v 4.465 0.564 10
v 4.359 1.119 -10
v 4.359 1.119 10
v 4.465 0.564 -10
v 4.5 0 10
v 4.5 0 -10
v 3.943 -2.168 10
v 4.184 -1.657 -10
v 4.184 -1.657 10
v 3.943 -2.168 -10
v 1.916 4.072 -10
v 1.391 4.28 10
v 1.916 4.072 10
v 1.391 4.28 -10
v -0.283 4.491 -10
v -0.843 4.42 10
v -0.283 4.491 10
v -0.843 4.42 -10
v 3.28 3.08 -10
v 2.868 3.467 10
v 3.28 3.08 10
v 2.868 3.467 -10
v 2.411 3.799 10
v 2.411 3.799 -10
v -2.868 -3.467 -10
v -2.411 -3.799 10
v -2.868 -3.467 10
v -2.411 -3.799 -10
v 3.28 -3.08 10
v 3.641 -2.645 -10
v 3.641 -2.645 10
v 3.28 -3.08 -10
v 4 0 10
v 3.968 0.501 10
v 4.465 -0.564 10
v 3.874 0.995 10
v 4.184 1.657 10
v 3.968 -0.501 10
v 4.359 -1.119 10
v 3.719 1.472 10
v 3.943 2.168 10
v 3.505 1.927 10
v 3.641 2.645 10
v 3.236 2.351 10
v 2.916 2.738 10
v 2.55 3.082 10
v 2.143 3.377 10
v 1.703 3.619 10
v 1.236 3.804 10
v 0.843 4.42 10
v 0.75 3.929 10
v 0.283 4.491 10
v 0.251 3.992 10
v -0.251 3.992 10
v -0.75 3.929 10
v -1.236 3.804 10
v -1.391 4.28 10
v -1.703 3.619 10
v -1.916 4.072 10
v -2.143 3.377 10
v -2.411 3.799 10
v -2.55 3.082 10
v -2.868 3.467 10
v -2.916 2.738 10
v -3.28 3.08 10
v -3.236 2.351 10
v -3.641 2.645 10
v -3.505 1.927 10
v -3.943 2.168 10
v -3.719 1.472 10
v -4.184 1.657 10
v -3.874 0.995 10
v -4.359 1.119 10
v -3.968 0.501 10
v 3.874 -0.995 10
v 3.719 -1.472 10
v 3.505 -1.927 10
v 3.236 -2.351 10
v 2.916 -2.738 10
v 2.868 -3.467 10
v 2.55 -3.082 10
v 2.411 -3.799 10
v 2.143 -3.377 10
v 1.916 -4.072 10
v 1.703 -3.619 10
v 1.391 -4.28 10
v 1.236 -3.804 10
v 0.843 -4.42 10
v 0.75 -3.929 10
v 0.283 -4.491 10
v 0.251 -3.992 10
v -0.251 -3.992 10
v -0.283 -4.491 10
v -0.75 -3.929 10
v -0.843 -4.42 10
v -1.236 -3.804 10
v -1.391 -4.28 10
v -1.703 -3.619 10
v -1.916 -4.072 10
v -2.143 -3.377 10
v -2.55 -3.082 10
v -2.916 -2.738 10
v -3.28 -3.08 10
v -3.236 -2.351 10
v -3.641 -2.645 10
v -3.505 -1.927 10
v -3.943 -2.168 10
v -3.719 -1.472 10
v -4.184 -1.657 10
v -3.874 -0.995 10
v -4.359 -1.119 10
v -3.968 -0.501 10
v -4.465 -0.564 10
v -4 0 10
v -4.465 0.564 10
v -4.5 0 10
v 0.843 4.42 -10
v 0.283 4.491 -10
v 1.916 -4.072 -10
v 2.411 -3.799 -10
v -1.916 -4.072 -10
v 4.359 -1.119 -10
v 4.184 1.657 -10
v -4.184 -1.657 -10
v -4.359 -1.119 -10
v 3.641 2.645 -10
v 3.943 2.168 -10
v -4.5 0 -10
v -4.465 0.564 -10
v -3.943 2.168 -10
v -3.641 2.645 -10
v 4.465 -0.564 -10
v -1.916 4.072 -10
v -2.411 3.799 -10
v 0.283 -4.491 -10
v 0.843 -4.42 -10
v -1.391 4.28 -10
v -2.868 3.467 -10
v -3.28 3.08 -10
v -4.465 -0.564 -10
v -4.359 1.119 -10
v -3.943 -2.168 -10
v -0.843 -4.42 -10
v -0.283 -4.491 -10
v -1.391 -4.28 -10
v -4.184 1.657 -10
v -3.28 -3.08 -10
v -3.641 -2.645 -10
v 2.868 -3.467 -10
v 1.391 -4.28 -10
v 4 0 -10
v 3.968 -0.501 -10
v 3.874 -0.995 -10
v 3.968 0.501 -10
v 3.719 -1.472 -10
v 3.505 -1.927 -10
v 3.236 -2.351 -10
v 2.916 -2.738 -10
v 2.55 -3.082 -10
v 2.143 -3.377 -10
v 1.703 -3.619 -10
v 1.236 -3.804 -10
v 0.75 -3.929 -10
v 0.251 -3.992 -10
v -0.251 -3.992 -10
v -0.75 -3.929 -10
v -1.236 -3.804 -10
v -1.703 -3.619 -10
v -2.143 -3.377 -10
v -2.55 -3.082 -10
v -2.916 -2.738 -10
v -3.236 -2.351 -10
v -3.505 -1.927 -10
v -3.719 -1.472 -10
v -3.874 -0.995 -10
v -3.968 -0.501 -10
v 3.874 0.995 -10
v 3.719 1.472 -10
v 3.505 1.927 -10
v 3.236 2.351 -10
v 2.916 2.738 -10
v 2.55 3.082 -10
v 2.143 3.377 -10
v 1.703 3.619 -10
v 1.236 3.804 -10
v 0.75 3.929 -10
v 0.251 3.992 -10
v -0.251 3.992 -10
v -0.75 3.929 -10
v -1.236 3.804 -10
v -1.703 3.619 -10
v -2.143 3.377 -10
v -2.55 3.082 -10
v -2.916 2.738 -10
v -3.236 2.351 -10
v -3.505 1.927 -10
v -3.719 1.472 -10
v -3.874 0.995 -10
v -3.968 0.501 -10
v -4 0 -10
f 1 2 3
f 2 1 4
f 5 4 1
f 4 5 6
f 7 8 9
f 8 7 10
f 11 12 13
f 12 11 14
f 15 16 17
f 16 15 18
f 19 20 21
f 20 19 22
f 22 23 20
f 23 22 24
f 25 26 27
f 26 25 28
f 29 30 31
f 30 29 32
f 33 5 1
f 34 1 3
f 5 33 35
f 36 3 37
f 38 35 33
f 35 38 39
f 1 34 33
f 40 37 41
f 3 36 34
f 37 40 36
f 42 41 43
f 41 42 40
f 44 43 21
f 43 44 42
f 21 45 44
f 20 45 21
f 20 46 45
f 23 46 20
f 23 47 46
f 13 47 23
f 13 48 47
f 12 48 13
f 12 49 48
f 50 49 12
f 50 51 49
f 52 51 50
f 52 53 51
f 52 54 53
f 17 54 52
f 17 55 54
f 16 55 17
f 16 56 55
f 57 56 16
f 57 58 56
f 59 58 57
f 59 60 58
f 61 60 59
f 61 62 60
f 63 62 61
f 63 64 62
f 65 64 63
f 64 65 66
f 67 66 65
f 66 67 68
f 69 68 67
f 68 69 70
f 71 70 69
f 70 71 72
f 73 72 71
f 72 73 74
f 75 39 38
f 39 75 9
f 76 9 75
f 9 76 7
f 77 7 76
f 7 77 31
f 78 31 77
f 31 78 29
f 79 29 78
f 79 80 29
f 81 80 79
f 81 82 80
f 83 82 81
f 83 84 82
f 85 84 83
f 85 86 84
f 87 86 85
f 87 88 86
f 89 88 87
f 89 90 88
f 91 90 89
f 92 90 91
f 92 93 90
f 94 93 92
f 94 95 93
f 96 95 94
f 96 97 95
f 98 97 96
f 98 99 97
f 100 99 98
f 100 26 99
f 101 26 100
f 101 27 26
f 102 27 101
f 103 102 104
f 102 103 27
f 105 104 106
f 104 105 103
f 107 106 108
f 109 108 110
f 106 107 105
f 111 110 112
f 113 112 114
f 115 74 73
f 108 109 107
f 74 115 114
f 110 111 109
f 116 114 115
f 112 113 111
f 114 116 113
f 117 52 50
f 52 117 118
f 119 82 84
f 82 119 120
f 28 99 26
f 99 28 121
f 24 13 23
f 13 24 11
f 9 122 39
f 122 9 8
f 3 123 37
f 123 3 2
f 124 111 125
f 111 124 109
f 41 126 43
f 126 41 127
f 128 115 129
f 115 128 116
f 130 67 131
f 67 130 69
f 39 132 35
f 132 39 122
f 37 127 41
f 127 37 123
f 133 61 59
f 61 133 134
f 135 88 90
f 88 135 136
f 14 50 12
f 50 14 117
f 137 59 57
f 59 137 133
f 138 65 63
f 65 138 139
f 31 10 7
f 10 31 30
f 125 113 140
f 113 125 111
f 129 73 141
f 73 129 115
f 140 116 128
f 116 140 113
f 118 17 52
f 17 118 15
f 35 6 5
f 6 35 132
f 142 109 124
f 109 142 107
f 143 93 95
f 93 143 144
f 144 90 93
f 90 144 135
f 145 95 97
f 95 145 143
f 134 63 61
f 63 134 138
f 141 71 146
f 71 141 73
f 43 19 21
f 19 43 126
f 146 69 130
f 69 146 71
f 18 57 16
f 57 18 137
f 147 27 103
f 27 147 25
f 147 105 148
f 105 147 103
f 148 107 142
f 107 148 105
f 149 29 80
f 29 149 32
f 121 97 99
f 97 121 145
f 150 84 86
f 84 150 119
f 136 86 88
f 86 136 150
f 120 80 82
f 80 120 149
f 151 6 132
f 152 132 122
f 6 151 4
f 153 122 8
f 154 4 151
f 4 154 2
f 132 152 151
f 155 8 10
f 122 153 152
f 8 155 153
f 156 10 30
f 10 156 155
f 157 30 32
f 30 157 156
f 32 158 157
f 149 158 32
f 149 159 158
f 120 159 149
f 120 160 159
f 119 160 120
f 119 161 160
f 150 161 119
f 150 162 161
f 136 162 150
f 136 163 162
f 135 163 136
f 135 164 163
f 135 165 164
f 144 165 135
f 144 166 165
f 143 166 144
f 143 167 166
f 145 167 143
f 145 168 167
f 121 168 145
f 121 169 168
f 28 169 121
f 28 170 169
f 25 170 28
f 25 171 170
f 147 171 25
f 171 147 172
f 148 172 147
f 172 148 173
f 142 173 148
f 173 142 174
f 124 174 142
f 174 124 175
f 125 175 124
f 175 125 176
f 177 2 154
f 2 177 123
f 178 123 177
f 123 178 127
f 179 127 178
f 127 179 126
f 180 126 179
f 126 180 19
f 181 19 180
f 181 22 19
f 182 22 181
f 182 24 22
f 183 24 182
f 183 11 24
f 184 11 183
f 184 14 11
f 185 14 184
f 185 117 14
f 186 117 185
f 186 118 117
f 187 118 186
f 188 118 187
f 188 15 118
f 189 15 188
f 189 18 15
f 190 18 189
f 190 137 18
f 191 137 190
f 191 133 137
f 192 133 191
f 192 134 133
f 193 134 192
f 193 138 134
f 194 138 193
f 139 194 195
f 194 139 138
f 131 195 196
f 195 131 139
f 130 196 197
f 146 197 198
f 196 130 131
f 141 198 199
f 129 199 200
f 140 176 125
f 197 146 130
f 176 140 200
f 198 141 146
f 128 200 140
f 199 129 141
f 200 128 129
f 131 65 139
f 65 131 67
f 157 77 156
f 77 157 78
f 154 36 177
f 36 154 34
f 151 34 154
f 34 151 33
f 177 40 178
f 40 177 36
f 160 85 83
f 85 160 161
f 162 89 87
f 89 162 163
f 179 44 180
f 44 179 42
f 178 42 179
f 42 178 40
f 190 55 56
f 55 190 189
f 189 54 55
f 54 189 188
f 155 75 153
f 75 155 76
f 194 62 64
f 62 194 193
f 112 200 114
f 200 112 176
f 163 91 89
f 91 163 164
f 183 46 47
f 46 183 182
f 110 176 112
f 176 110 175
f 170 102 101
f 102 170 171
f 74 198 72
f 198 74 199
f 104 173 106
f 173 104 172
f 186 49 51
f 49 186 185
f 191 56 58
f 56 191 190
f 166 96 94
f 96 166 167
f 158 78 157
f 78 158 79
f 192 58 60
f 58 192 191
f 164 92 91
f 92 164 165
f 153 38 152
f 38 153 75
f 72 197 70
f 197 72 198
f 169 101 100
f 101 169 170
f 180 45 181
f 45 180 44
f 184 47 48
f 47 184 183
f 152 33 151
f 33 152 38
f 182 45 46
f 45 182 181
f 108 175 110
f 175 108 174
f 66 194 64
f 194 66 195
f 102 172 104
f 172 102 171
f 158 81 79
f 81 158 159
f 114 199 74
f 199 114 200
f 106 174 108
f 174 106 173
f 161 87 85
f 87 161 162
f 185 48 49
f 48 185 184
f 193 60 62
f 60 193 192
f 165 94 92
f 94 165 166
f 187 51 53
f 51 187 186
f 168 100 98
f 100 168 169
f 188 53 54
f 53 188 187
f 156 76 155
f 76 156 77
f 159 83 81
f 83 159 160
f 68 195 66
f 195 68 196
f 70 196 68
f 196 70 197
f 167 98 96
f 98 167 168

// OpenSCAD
$fn = 50;


difference() {
	union() {
		translate(v = [0, 0, -10.0000000000]) {
			cylinder(h = 20, r = 4.5000000000);
		}
	}
	union() {
		translate(v = [0, 0, -100.0000000000]) {
			cylinder(h = 200, r = 4.0000000000);
		}
	}
}
